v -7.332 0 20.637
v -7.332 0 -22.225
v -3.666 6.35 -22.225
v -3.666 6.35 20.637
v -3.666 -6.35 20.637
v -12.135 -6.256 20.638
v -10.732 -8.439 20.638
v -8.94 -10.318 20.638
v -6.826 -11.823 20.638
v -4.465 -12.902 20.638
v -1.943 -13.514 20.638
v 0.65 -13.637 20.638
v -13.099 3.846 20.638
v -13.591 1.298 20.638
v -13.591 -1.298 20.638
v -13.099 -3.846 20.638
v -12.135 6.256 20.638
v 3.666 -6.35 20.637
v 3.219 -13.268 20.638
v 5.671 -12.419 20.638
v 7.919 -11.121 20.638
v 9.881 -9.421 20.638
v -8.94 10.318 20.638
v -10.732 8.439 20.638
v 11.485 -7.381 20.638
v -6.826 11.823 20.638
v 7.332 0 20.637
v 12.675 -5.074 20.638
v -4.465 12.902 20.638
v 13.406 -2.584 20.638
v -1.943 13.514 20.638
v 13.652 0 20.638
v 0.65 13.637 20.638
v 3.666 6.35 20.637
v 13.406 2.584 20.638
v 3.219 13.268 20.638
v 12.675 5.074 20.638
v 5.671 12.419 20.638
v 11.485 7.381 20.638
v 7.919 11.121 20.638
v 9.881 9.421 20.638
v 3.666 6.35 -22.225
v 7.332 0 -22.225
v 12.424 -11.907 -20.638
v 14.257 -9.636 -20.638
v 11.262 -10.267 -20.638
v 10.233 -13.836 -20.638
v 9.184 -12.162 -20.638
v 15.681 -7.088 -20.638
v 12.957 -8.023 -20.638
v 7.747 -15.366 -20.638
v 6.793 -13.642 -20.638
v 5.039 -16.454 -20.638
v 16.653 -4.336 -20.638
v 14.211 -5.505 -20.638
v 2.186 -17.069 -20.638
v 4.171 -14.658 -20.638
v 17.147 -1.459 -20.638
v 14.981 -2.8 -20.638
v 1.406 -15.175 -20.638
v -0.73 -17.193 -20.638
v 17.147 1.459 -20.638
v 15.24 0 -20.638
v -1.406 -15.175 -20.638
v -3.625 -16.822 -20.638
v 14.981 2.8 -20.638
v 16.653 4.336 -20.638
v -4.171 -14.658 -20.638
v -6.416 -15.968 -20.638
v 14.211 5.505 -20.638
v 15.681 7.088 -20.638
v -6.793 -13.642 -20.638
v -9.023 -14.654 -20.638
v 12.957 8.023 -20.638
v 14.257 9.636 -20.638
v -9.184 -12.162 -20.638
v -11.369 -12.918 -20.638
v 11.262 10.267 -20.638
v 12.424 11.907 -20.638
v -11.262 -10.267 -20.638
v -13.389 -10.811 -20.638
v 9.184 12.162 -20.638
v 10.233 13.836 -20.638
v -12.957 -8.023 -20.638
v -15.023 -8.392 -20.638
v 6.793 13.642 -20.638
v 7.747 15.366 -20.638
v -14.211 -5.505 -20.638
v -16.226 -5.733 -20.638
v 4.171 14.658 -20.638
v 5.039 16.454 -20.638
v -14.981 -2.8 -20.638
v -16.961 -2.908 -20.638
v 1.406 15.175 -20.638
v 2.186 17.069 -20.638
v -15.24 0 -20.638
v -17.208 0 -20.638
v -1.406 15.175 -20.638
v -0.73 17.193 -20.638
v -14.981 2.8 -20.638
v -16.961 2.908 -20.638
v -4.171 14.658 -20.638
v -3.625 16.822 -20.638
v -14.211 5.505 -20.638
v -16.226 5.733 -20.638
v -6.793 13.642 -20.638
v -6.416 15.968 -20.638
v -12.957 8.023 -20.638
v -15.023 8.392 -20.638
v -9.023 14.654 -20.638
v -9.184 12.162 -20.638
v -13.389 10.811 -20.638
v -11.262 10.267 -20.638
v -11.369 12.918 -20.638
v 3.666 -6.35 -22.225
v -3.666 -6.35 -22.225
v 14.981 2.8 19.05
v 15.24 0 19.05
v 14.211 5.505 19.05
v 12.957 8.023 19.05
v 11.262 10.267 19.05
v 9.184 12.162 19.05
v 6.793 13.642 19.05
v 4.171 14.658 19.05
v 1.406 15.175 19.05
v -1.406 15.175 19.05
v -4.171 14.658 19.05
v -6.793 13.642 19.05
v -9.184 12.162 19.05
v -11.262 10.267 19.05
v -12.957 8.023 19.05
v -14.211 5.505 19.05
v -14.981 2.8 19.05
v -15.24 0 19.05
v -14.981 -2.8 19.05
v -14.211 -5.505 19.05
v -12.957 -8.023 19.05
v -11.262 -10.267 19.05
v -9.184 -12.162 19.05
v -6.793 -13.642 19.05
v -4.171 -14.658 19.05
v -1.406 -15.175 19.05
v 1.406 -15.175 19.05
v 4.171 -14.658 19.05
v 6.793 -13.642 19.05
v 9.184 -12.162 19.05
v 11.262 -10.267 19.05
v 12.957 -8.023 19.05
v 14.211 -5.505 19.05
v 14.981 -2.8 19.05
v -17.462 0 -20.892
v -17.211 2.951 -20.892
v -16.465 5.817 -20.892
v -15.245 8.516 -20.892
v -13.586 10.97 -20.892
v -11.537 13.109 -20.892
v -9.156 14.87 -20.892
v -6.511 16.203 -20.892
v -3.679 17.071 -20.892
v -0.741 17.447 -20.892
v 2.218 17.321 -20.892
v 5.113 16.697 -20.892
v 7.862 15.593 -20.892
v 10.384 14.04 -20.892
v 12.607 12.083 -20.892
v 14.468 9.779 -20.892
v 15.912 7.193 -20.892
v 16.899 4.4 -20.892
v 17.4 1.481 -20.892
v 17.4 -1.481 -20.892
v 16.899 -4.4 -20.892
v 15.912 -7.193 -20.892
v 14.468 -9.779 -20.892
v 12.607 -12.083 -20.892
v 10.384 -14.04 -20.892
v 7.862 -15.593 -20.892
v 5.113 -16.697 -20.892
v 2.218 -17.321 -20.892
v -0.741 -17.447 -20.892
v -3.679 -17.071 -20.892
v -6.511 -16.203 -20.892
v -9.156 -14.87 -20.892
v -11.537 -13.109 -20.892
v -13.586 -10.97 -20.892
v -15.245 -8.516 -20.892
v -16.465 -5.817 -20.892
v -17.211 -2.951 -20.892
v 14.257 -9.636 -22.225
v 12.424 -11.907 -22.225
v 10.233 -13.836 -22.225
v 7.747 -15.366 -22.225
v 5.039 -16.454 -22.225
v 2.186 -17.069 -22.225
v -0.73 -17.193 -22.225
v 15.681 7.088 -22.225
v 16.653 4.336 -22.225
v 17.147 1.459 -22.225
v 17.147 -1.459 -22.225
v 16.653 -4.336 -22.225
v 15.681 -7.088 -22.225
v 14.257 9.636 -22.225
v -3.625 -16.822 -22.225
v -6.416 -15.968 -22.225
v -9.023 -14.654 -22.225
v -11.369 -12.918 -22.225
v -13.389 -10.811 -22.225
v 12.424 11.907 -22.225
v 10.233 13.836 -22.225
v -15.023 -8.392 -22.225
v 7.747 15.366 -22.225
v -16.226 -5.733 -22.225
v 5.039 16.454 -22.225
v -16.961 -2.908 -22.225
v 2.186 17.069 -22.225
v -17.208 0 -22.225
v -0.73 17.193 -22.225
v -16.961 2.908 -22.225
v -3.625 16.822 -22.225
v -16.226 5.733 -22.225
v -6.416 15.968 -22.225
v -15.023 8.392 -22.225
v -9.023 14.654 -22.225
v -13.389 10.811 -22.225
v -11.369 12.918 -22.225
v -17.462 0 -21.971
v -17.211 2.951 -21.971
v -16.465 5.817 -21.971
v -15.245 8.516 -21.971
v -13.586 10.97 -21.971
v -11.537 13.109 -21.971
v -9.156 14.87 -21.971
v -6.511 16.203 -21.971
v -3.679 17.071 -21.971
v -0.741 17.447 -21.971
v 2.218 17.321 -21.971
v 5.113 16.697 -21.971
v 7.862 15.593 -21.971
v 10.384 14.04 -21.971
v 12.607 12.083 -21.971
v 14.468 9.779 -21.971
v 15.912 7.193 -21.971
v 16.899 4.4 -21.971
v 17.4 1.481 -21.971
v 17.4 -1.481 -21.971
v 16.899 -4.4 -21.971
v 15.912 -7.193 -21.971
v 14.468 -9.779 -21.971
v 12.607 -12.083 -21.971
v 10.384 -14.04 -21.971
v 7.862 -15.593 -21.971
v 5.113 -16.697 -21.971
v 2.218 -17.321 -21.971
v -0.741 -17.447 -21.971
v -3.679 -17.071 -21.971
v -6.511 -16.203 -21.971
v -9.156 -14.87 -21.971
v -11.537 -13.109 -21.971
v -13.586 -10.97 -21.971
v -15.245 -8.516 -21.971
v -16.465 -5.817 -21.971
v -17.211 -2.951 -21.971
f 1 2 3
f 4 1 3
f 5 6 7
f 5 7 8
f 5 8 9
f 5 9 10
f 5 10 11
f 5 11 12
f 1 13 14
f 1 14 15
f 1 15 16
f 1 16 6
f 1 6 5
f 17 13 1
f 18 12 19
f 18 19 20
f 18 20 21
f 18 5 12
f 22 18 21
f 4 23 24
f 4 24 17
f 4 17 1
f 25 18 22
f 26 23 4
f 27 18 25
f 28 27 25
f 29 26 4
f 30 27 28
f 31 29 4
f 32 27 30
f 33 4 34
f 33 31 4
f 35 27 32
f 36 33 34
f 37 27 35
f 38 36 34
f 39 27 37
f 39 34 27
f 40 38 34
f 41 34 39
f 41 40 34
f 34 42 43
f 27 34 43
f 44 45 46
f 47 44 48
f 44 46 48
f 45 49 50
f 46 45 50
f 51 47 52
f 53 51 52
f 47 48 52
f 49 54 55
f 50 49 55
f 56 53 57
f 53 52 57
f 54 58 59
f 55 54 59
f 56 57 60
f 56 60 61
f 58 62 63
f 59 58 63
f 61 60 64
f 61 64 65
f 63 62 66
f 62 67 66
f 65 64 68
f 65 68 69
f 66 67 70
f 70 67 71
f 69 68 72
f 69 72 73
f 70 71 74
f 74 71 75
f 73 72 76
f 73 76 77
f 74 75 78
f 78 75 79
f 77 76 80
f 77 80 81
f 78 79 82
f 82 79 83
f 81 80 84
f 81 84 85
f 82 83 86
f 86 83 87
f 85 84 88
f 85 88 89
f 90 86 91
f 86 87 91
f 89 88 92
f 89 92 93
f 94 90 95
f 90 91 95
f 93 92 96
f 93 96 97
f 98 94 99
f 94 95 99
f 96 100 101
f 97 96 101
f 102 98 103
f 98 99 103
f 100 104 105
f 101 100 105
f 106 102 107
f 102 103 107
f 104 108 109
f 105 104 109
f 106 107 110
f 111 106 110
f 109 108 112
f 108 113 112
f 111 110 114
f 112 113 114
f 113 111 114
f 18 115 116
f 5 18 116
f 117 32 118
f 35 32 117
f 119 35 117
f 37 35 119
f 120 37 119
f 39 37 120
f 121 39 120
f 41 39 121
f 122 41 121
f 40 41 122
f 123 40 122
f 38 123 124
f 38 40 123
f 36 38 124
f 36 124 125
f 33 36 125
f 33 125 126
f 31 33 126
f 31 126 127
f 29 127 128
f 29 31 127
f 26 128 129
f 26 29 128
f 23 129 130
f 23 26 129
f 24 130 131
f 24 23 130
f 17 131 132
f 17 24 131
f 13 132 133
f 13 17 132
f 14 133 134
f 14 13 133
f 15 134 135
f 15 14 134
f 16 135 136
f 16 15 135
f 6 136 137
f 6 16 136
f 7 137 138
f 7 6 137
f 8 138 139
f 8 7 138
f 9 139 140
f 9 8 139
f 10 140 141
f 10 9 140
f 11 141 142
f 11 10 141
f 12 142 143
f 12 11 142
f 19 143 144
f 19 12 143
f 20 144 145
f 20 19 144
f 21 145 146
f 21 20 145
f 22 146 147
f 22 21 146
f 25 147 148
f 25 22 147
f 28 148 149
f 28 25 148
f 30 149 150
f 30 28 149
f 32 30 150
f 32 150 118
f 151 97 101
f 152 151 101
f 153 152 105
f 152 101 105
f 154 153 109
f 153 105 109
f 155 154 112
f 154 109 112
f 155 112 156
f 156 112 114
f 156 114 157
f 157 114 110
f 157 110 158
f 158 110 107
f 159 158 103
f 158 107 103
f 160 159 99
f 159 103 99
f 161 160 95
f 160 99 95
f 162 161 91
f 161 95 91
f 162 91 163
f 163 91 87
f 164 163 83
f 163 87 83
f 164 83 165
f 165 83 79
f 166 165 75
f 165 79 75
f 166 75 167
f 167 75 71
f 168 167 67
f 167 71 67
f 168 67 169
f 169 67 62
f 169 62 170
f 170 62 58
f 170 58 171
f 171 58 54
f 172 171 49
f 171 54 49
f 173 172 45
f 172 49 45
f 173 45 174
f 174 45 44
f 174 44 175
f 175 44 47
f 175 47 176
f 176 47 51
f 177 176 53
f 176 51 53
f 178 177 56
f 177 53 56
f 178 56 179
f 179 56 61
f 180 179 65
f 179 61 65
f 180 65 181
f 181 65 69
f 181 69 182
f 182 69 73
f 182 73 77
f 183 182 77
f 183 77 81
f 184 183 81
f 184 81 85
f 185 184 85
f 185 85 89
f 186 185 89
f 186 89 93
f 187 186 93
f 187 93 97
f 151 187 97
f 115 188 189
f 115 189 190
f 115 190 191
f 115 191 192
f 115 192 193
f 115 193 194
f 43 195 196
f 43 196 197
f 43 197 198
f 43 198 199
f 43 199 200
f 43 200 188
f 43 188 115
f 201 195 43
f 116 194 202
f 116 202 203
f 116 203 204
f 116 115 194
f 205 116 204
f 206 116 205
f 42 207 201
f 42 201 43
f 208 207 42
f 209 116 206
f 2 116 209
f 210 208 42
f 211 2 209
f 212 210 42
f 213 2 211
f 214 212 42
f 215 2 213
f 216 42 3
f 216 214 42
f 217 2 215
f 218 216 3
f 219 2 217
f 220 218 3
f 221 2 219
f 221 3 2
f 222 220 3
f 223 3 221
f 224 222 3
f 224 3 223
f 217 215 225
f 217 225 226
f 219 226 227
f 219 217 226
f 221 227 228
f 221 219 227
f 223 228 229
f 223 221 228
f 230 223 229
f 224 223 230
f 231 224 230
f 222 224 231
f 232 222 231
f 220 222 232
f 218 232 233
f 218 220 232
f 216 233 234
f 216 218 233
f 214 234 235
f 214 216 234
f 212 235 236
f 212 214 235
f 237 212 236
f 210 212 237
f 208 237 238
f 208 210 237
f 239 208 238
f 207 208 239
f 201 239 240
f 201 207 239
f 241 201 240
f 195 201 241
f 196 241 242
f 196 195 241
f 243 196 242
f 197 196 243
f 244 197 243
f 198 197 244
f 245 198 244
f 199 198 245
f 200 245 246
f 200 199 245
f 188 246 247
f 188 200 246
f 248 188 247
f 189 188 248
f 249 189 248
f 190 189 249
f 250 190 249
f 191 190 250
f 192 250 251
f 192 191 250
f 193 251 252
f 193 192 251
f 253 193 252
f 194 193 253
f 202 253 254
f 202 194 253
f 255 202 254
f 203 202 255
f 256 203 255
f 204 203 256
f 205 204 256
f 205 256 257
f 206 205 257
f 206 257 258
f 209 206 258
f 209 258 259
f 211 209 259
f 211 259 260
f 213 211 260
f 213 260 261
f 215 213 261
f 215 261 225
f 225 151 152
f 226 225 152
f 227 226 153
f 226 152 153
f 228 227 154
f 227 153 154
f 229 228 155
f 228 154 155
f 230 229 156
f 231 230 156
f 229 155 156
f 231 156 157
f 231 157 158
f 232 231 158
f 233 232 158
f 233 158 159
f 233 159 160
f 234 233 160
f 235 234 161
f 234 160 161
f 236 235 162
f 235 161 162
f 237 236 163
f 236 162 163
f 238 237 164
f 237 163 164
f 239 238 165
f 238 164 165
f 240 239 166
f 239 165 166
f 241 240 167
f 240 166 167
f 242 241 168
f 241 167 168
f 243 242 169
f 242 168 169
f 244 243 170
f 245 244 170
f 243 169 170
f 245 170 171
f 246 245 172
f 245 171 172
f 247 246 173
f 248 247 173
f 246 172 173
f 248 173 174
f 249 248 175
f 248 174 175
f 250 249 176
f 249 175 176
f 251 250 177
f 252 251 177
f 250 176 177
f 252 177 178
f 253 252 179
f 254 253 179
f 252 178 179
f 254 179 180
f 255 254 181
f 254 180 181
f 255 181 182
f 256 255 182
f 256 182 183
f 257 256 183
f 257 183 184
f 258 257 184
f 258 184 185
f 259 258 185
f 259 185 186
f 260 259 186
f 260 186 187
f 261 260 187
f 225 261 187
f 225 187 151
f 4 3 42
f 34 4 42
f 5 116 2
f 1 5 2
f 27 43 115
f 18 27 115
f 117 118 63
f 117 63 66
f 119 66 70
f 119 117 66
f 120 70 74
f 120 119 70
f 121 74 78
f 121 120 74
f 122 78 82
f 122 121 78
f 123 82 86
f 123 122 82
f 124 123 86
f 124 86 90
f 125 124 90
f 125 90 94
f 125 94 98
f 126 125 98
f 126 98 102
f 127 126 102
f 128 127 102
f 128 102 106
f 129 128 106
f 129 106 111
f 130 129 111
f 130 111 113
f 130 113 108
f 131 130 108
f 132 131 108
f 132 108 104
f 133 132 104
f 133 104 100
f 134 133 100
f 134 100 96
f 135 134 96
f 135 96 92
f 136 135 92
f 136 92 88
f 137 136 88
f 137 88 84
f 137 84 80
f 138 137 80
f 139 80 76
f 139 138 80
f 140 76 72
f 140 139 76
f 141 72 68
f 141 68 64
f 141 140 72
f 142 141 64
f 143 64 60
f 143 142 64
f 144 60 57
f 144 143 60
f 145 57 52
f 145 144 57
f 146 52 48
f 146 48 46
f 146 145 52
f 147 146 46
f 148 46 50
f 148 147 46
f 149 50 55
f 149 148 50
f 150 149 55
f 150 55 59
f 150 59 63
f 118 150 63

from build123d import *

# Parameters (mm, degrees)
SKETCH1_R           = 15.24
BOSS_EXTRUDE1_DEPTH = 20.6375
CHAMFER1_SIZE       = 1.5875
SKETCH2_R           = 17.4625
BOSS_EXTRUDE2_DEPTH = 1.5875
CUT_EXTRUDE1_DEPTH  = 50.467885732
CHAMFER2_SIZE       = 0.254


with BuildPart() as part:
    # Sketch1 → Boss-Extrude1 (new, symmetric)
    with BuildSketch(Plane.XY):
        Circle(SKETCH1_R)
    extrude(amount=BOSS_EXTRUDE1_DEPTH, both=True)

    # Chamfer1
    chamfer1_edges = [part.edges().sort_by_distance(p)[0] for p in [
        (-15.24, 0, 20.6375),
    ]]
    chamfer(chamfer1_edges, length=CHAMFER1_SIZE)

    # Sketch2 → Boss-Extrude2 (add)
    with BuildSketch(Plane(origin=(0, 0, -20.6375), x_dir=(-1, 0, 0), z_dir=(0, 0, -1))):
        Circle(SKETCH2_R)
    extrude(amount=BOSS_EXTRUDE2_DEPTH)

    # Sketch3 → Cut-Extrude1 (cut, through all)
    with BuildSketch(Plane(origin=(0, 0, -22.225), x_dir=(-1, 0, 0), z_dir=(0, 0, -1))):
        Polygon((7.332348419, 0), (3.666174209, 6.35), (-3.666174209, 6.35), (-7.332348419, 0), (-3.666174209, -6.35), (3.666174209, -6.35), align=None)
    extrude(amount=-CUT_EXTRUDE1_DEPTH, mode=Mode.SUBTRACT)

    # Chamfer2
    chamfer2_edges = [part.edges().sort_by_distance(p)[0] for p in [
        (17.4625, 0, -20.6375),
        (17.4625, 0, -22.225),
    ]]
    chamfer(chamfer2_edges, length=CHAMFER2_SIZE)


solid = part.part
